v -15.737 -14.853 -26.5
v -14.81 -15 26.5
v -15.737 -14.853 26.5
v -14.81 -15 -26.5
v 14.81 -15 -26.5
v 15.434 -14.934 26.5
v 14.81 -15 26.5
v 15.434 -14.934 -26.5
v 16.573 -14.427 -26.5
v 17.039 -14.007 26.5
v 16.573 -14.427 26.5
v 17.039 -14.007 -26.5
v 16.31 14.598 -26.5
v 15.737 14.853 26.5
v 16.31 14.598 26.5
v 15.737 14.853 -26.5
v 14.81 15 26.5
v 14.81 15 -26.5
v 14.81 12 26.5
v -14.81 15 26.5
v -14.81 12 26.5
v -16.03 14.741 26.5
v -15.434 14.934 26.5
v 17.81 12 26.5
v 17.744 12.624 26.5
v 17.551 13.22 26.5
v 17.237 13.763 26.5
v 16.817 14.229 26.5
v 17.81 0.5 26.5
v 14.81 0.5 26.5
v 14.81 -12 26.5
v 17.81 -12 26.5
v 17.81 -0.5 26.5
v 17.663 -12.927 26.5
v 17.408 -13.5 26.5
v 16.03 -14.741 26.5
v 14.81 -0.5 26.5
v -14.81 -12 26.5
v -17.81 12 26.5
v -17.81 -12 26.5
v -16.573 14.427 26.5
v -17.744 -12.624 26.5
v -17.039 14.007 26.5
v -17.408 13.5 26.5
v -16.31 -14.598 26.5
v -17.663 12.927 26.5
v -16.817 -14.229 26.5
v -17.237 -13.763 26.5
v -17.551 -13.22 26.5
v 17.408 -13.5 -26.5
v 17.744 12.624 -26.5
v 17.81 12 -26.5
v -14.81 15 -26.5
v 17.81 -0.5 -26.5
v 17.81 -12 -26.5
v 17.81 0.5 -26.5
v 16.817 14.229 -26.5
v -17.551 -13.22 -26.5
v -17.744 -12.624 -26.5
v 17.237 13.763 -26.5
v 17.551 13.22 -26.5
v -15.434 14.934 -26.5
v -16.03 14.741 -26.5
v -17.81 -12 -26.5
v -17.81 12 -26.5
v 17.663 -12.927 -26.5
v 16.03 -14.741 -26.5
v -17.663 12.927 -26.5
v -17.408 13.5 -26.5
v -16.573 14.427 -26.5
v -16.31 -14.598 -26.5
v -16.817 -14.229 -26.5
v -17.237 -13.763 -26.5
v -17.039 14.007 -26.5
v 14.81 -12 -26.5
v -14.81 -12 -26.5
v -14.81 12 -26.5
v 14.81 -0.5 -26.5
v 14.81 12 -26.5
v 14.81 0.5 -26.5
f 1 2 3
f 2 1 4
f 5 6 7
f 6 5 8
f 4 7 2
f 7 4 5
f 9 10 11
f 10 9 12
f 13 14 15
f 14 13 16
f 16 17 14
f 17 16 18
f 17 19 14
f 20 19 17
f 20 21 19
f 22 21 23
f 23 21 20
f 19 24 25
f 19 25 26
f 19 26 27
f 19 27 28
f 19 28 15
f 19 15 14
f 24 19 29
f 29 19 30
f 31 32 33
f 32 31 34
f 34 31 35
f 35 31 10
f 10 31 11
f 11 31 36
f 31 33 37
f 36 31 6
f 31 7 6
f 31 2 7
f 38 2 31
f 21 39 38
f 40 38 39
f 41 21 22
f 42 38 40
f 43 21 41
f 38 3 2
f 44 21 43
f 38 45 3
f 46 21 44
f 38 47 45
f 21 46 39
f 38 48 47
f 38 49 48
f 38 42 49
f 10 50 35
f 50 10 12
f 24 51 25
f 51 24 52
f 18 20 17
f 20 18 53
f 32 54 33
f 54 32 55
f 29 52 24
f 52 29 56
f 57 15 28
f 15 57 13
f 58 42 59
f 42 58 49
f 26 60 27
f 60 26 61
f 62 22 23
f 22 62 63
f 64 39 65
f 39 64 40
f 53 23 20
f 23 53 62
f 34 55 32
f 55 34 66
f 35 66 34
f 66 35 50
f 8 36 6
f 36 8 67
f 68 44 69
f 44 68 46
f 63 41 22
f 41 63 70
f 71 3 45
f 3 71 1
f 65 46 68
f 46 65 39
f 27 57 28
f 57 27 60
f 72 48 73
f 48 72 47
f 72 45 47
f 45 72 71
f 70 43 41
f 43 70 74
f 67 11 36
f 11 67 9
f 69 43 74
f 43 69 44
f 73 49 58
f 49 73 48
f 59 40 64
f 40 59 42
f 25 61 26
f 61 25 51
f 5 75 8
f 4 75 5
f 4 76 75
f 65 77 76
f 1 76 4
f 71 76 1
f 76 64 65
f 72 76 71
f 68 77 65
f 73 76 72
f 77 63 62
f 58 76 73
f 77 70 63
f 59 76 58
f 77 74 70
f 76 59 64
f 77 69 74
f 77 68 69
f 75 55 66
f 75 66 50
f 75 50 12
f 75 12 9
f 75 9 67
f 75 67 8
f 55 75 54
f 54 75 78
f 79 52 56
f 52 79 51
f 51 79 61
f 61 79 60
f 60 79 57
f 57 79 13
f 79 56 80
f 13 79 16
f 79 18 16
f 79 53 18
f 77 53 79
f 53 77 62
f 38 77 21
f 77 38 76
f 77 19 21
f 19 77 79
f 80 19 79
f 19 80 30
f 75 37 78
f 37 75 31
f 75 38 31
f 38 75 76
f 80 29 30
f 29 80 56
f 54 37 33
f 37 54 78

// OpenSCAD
use <myTools.scad>

INSIDE = [ 29.62, 25-1, 50];
THICK = 3;

difference()
{
    color("PINK", .9)//
    abox_punch(INSIDE, +THICK, round_out=3, true);

    translate([INSIDE.x/2 + THICK/2, 0, 0 ])
    cube ([ THICK+1, THICK/3, INSIDE.z +3],true);
}
